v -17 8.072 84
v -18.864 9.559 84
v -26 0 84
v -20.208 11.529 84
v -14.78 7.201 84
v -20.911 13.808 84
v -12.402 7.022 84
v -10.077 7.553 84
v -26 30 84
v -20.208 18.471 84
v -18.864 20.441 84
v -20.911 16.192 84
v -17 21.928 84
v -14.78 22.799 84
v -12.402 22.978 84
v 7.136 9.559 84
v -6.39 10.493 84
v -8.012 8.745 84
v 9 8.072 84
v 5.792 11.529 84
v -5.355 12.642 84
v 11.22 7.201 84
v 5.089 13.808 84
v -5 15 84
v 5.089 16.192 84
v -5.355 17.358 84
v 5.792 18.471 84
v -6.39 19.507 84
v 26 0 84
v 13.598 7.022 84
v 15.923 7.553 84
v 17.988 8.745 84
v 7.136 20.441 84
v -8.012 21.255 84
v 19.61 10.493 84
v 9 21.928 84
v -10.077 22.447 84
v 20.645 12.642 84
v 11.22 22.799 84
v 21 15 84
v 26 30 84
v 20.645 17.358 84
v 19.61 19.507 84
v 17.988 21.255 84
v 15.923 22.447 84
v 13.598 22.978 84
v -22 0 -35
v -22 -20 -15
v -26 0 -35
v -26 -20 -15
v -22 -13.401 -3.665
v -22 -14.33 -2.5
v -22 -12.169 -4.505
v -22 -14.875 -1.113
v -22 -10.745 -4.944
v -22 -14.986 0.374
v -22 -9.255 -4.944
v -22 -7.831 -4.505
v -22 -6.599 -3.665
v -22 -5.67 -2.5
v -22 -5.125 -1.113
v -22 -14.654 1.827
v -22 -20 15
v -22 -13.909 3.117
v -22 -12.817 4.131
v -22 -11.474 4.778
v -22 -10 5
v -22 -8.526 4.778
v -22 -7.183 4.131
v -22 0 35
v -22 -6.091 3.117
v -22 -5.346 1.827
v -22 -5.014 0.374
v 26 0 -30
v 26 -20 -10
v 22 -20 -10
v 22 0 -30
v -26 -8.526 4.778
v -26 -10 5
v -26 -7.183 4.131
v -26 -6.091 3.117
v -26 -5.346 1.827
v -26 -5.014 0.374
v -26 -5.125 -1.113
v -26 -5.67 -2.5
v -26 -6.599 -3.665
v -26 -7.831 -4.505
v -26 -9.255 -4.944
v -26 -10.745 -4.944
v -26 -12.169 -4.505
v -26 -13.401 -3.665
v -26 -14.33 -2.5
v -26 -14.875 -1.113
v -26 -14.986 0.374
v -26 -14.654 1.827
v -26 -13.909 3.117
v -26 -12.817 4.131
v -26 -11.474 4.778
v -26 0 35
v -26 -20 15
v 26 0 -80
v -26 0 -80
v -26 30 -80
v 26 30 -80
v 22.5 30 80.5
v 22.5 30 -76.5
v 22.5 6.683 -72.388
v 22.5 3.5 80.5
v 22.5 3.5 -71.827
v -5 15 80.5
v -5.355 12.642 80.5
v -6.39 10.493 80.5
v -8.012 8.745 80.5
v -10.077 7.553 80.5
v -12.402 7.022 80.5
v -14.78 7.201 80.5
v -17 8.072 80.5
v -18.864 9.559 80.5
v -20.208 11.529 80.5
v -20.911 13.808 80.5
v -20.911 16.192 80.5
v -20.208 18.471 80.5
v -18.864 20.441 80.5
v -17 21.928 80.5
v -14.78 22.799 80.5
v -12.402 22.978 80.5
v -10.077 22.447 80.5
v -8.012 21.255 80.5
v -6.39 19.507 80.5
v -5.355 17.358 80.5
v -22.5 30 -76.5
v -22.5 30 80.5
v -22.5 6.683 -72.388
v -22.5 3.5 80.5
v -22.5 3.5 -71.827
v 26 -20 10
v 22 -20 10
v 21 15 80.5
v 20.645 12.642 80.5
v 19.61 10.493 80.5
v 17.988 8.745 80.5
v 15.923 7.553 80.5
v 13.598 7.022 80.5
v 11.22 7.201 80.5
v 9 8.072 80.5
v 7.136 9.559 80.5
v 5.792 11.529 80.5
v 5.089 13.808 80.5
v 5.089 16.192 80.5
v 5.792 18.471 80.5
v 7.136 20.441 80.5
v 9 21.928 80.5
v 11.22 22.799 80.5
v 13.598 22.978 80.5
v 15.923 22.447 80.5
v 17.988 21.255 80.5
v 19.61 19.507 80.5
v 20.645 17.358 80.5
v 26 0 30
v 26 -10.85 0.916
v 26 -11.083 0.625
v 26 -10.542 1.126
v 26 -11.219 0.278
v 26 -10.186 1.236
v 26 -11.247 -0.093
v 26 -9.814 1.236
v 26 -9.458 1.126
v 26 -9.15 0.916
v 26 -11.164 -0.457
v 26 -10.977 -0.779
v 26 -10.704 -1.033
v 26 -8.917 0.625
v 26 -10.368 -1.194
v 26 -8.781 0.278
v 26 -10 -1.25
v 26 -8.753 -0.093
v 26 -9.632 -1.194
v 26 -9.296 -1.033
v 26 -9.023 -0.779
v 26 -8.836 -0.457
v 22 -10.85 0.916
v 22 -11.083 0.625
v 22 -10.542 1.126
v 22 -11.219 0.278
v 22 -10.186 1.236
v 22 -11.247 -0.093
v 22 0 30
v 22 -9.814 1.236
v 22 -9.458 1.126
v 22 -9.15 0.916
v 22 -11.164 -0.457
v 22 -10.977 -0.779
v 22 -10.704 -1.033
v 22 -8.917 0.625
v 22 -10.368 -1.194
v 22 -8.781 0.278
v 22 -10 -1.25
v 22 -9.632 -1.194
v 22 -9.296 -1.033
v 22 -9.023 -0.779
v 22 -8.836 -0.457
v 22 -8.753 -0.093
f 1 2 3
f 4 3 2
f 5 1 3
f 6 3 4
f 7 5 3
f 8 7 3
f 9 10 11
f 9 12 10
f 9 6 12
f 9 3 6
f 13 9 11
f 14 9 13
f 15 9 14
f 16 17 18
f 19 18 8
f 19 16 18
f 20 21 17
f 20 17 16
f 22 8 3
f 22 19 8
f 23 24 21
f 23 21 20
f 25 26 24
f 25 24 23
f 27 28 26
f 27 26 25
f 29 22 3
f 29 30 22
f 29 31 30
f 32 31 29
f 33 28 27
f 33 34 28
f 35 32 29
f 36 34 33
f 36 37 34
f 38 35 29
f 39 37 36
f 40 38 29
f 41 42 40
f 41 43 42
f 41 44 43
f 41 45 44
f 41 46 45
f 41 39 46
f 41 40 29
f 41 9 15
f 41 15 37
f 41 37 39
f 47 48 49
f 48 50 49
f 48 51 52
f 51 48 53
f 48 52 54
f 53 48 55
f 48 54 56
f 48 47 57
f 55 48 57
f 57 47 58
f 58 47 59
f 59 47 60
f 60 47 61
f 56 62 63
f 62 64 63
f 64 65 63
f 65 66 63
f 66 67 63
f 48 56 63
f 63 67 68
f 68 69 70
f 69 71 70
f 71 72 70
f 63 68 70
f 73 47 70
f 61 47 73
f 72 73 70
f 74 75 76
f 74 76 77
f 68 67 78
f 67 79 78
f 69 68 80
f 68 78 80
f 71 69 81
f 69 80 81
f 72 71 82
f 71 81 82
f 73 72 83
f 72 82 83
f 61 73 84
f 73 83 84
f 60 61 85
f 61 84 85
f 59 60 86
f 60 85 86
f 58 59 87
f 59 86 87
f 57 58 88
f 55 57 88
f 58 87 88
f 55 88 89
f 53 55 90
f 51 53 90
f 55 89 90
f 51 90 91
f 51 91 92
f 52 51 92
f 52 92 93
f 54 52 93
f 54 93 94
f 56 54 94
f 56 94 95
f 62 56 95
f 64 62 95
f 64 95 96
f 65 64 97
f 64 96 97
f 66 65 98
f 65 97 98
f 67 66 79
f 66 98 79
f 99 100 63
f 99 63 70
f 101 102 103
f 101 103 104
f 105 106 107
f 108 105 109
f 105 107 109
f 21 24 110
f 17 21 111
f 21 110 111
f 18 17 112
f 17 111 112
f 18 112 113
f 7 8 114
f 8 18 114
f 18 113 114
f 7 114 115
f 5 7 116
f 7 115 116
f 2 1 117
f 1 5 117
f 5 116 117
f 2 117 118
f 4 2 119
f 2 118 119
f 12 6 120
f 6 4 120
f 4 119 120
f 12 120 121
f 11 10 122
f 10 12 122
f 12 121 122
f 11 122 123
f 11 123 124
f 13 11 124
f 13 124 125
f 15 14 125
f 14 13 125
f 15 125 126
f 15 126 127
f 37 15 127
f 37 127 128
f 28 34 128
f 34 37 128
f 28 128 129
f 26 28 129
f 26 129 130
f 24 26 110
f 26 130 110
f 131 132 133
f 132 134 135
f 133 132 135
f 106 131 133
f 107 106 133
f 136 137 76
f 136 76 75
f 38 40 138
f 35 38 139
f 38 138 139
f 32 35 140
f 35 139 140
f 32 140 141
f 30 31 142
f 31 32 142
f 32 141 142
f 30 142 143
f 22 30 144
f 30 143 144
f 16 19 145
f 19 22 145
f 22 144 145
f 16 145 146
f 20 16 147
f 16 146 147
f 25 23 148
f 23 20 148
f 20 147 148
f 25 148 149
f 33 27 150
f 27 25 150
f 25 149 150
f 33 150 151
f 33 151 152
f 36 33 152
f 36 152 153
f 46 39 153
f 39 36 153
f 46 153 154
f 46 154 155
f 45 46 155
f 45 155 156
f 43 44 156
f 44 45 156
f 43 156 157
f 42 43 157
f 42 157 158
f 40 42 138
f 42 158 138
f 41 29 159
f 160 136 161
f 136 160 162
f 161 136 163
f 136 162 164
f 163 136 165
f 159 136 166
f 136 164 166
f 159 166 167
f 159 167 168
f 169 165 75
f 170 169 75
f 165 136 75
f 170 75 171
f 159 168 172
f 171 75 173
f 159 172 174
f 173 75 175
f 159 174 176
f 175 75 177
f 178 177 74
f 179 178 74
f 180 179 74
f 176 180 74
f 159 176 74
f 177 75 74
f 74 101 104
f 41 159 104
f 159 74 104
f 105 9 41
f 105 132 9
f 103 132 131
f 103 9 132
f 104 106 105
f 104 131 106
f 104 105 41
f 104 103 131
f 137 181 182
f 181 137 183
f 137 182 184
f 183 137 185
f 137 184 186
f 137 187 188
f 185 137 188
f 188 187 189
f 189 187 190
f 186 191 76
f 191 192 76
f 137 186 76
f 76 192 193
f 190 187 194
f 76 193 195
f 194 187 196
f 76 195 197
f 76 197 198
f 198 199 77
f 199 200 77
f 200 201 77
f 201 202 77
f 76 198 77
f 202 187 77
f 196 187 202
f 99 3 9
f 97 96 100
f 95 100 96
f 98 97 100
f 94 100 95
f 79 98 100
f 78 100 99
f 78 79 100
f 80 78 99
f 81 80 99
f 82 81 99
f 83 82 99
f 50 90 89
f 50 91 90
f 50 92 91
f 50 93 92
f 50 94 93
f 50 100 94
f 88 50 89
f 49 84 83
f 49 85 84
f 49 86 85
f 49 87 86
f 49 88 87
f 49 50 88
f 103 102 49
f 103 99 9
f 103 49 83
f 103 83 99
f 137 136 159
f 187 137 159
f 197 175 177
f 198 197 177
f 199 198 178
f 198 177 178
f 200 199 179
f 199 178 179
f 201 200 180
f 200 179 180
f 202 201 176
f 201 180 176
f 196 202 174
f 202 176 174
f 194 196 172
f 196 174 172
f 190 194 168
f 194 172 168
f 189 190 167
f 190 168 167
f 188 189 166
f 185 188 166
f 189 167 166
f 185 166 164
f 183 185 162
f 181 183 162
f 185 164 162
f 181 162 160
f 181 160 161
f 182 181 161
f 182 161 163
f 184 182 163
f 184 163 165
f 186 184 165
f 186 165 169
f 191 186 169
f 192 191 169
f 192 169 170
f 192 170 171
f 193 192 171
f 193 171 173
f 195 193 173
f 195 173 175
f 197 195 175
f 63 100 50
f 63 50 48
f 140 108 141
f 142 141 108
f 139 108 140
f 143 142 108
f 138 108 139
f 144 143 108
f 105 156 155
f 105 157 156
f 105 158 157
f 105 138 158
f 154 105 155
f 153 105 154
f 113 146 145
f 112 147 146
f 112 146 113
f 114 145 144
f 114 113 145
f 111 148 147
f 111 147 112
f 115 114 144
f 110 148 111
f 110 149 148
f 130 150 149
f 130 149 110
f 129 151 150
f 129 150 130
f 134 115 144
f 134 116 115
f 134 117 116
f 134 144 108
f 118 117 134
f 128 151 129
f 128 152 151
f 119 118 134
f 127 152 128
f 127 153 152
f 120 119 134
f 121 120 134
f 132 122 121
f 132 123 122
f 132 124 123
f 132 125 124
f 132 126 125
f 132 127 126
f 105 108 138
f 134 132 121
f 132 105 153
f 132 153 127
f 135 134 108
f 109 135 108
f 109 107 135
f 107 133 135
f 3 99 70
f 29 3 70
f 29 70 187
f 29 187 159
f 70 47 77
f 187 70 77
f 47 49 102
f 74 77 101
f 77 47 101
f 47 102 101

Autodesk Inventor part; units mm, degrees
ref_plane "YZ Plane" through (0, 0, 0) normal (1, 0, 0) x (0, 1, 0)
ref_plane "XZ Plane" through (0, 0, 0) normal (0, 1, 0) x (-1, 0, 0)
ref_plane "XY Plane" through (0, 0, 0) normal (0, 0, 1) x (1, 0, 0)
sketch "Szkic1" plane through (0, 0, 0) normal (0, 1, 0) x (-1, 0, 0)
  line L0 (-26, 80) -> (26, 80)
  line L1 (26, 80) -> (26, -80)
  line L2 (26, -80) -> (-26, -80)
  line L3 (-26, -80) -> (-26, 80)
  line L4 (-26, 80) -> (26, -80) construction
  line L5 (26, 80) -> (-26, -80) construction
  point P0 (0, 0)
  dimension "d0" = 52
  dimension "d1" = 160
extrude "Wyciągnięcie proste1" add sketch "Szkic1" along normal blind 30
shell "Skorupa1" thickness 3.5 removed faces 1 at (8.6667, 30, 26.6667)
sketch "Szkic3" plane through (-26, 0, 80) normal (0, 0, 1) x (1, 0, 0)
  line L0 (52, 0) -> (52, 30) projected
  line L1 (0, 0) -> (52, 0)
  line L2 (52, 0) -> (52, 30)
  line L3 (52, 30) -> (0, 30)
  line L4 (0, 30) -> (0, 0)
  line L5 (52, 0) -> (0, 0) projected
  line L6 (52, 30) -> (0, 30) projected
  line L7 (48.5, 0) -> (3.5, 0)
  line L8 (3.5, 0) -> (3.5, 30)
  line L9 (3.5, 30) -> (48.5, 30)
  line L10 (48.5, 30) -> (48.5, 0)
  line L11 (3.5, 25) -> (48.5, 25)
  line L12 (48.5, 25) -> (48.5, 5)
  line L13 (48.5, 5) -> (3.5, 5)
  line L14 (3.5, 5) -> (3.5, 25)
  circle A0 centre (13, 15) radius 8
  circle A1 centre (39, 15) radius 8
  point P0 (26, 0)
  point P1 (3.5, 15)
  dimension "d7" = 52
  dimension "d8" = 30
  dimension "d9" = 3.5
  dimension "d10" = 3.5
  dimension "d11" = 45
  dimension "d12" = 45
  dimension "d13" = 20
  dimension "d14" = 5
  dimension "d15" = 16
  dimension "d16" = 16
  dimension "d17" = 26
  dimension "d18" = 10
  dimension "d19" = 9.5
extrude "Wyciągnięcie proste2" cut sketch "Szkic3" against normal up to next contours A0 | A1
sketch "Szkic4" plane through (-26, 0, 80) normal (0, 0, 1) x (1, 0, 0)
  line L0 (0, 0) -> (0, 30) projected
  line L1 (0, 30) -> (52, 30) projected
  line L2 (0, 0) -> (52, 0)
  line L3 (52, 0) -> (52, 30)
  line L4 (52, 30) -> (0, 30)
  line L5 (0, 30) -> (0, 0)
  circle A0 centre (13, 15) radius 8 projected
  circle A1 centre (13, 15) radius 8
  circle A2 centre (39, 15) radius 8 projected
  circle A3 centre (39, 15) radius 8
  point P0 (26, 0)
  point P1 (47, 22.5)
extrude "Wyciągnięcie proste3" add sketch "Szkic4" along normal blind 4
sketch "Szkic8" plane through (0, 0, 0) normal (0, -1, 0) x (1, 0, 0)
  line L0 (26, 10) -> (22, 10)
  line L1 (22, 10) -> (22, -10)
  line L2 (22, -10) -> (26, -10)
  line L3 (26, -10) -> (26, 10)
  line L4 (26, -80) -> (26, 84) projected
  point P0 (0, 0)
  point P1 (26, 0)
  point P2 (26, 2)
  dimension "d46" = 20
  dimension "d47" = 4
extrude "Wyciągnięcie proste6" add sketch "Szkic8" along normal blind 20
sketch "Szkic11" plane through (0, 0, 0) normal (0, -1, 0) x (1, 0, 0)
  line L0 (-26, -80) -> (-26, 84) projected
  line L1 (-26, 15) -> (-22, 15)
  line L2 (-22, 15) -> (-22, -15)
  line L3 (-22, -15) -> (-26, -15)
  line L4 (-26, -15) -> (-26, 15)
  point P0 (0, 0)
  dimension "d55" = 4
  dimension "d56" = 30
  dimension "d57" = 15
extrude "Wyciągnięcie proste8" add sketch "Szkic11" along normal blind 20
sketch "Szkic12" plane through (-26, 0, -80) normal (-1, 0, 0) x (0, 0, 1)
  circle A0 centre (80, -10) radius 5
  line L0 (95, 0) -> (95, -20) projected
  line L1 (95, -20) -> (65, -20) projected
  point P0 (80, 0)
  dimension "d60" = 10
  dimension "d61" = 15
  dimension "d62" = 10
extrude "Wyciągnięcie proste9" cut sketch "Szkic12" against normal blind 20
sketch "Szkic13" plane through (-26, 0, -80) normal (-1, 0, 0) x (0, 0, 1)
  line L0 (95, -20) -> (65, -20) projected
  line L1 (95, -20) -> (109.2717, -5.7283)
  line L2 (95, -20) -> (115.1833, -20) construction
  line L3 (109.2717, -5.7283) -> (115, 0)
  line L4 (95, 0) -> (164, 0) projected
  line L5 (95, 0) -> (95, -20) projected
  line L6 (95, 0) -> (95, -20)
  line L7 (65, 0) -> (65, -20) projected
  line L8 (65, -20) -> (48.9371, -3.9371)
  line L9 (65, -20) -> (87.7163, -20) construction
  line L10 (48.9371, -3.9371) -> (45, 0)
  line L11 (0, 0) -> (70, 0) projected
  line L12 (95, 0) -> (65, 0) projected
  line L13 (65, 0) -> (65, -20)
  line L14 (65, 0) -> (45, 0)
  line L15 (115, 0) -> (95, 0)
  point P0 (80, 0)
  dimension "d65" = 45
  dimension "d67" = 135
extrude "Wyciągnięcie proste10" add sketch "Szkic13" against normal blind 4 contours L5 L4 L3 L1 | L8 L10 L11 L7
sketch "Szkic14" plane through (26, 0, -80) normal (1, 0, 0) x (0, 0, -1)
  line L0 (-70, -20) -> (-50, 0)
  line L1 (-70, -20) -> (-41.7157, -20) construction
  line L2 (-70, 0) -> (-70, -20) projected
  line L3 (-50, 0) -> (-70, 0)
  line L4 (-70, 0) -> (-70, -20)
  line L5 (-90, 0) -> (-90, -20) projected
  line L6 (-90, -20) -> (-110, 0)
  line L7 (-90, -20) -> (-61.7157, -20) construction
  line L8 (-110, 0) -> (-90, 0)
  line L9 (-90, 0) -> (-90, -20)
  point P0 (-80, 0)
  point P1 (-115, 0)
  point P2 (-45, 0)
  dimension "d70" = 45
  dimension "d71" = 135
extrude "Wyciągnięcie proste11" add sketch "Szkic14" against normal blind 4
sketch "Szkic15" plane through (22.5, 3.5, 76.5) normal (0, 0, -1) x (-1, 0, 0)
  line L0 (0, 26.5) -> (45, 26.5) projected
  line L1 (45, 26.5) -> (0, 26.5)
  line L2 (0, 26.5) -> (0, -1)
  line L3 (0, -1) -> (45, -1)
  line L4 (45, -1) -> (45, 26.5)
  point P0 (22.5, -3.5)
  point P1 (0, 26.5)
  dimension "d74" = 27.5
extrude "Wyciągnięcie proste12" cut sketch "Szkic15" against normal blind 4
sketch "Szkic17" plane through (-22.5, 3.5, -76.5) normal (1, 0, 0) x (0, 0, -1)
  line L0 (0, 26.5) -> (-4.1115, 3.1827)
  line L1 (0, 26.5) -> (23.677, 26.5) construction
  line L2 (-4.1115, 3.1827) -> (-5.1108, -2.485)
  line L3 (-4.6727, 0) -> (0, 0)
  line L4 (-157, 26.5) -> (0, 26.5) projected
  line L5 (0, 0) -> (0, 26.5)
  point P0 (-76.5, -3.5)
  dimension "d77" = 100
extrude "Wyciągnięcie proste13" add sketch "Szkic17" along normal blind 48
sketch "Szkic20" plane through (22.5, 3.5, 76.5) normal (0, 0, 1) x (1, 0, 0)
  line L0 (0, -1) -> (0, 26.5) projected
  line L1 (-45, 0) -> (0, 0)
  line L2 (0, 0) -> (0, -1)
  line L3 (0, -1) -> (-45, -1)
  line L4 (-45, -1) -> (-45, 0)
  point P0 (-22.5, -3.5)
extrude "Wyciągnięcie proste14" add sketch "Szkic20" along normal blind 7
sketch "Szkic25" plane through (26, 0, -80) normal (1, 0, 0) x (0, 0, -1)
  circle A0 centre (-80, -10) radius 5 projected
  circle A1 centre (-80, -10) radius 1.25
  point P0 (-80, 0)
  dimension "d84" = 2.5
extrude "Wyciągnięcie proste15" cut sketch "Szkic25" against normal up to next contours A1
equation "\"d10\" = d9"
equation "\"d14\" = -0.5 * d13 + 0.5 * d8"
equation "\"d18\" = 0.5 * d13"
